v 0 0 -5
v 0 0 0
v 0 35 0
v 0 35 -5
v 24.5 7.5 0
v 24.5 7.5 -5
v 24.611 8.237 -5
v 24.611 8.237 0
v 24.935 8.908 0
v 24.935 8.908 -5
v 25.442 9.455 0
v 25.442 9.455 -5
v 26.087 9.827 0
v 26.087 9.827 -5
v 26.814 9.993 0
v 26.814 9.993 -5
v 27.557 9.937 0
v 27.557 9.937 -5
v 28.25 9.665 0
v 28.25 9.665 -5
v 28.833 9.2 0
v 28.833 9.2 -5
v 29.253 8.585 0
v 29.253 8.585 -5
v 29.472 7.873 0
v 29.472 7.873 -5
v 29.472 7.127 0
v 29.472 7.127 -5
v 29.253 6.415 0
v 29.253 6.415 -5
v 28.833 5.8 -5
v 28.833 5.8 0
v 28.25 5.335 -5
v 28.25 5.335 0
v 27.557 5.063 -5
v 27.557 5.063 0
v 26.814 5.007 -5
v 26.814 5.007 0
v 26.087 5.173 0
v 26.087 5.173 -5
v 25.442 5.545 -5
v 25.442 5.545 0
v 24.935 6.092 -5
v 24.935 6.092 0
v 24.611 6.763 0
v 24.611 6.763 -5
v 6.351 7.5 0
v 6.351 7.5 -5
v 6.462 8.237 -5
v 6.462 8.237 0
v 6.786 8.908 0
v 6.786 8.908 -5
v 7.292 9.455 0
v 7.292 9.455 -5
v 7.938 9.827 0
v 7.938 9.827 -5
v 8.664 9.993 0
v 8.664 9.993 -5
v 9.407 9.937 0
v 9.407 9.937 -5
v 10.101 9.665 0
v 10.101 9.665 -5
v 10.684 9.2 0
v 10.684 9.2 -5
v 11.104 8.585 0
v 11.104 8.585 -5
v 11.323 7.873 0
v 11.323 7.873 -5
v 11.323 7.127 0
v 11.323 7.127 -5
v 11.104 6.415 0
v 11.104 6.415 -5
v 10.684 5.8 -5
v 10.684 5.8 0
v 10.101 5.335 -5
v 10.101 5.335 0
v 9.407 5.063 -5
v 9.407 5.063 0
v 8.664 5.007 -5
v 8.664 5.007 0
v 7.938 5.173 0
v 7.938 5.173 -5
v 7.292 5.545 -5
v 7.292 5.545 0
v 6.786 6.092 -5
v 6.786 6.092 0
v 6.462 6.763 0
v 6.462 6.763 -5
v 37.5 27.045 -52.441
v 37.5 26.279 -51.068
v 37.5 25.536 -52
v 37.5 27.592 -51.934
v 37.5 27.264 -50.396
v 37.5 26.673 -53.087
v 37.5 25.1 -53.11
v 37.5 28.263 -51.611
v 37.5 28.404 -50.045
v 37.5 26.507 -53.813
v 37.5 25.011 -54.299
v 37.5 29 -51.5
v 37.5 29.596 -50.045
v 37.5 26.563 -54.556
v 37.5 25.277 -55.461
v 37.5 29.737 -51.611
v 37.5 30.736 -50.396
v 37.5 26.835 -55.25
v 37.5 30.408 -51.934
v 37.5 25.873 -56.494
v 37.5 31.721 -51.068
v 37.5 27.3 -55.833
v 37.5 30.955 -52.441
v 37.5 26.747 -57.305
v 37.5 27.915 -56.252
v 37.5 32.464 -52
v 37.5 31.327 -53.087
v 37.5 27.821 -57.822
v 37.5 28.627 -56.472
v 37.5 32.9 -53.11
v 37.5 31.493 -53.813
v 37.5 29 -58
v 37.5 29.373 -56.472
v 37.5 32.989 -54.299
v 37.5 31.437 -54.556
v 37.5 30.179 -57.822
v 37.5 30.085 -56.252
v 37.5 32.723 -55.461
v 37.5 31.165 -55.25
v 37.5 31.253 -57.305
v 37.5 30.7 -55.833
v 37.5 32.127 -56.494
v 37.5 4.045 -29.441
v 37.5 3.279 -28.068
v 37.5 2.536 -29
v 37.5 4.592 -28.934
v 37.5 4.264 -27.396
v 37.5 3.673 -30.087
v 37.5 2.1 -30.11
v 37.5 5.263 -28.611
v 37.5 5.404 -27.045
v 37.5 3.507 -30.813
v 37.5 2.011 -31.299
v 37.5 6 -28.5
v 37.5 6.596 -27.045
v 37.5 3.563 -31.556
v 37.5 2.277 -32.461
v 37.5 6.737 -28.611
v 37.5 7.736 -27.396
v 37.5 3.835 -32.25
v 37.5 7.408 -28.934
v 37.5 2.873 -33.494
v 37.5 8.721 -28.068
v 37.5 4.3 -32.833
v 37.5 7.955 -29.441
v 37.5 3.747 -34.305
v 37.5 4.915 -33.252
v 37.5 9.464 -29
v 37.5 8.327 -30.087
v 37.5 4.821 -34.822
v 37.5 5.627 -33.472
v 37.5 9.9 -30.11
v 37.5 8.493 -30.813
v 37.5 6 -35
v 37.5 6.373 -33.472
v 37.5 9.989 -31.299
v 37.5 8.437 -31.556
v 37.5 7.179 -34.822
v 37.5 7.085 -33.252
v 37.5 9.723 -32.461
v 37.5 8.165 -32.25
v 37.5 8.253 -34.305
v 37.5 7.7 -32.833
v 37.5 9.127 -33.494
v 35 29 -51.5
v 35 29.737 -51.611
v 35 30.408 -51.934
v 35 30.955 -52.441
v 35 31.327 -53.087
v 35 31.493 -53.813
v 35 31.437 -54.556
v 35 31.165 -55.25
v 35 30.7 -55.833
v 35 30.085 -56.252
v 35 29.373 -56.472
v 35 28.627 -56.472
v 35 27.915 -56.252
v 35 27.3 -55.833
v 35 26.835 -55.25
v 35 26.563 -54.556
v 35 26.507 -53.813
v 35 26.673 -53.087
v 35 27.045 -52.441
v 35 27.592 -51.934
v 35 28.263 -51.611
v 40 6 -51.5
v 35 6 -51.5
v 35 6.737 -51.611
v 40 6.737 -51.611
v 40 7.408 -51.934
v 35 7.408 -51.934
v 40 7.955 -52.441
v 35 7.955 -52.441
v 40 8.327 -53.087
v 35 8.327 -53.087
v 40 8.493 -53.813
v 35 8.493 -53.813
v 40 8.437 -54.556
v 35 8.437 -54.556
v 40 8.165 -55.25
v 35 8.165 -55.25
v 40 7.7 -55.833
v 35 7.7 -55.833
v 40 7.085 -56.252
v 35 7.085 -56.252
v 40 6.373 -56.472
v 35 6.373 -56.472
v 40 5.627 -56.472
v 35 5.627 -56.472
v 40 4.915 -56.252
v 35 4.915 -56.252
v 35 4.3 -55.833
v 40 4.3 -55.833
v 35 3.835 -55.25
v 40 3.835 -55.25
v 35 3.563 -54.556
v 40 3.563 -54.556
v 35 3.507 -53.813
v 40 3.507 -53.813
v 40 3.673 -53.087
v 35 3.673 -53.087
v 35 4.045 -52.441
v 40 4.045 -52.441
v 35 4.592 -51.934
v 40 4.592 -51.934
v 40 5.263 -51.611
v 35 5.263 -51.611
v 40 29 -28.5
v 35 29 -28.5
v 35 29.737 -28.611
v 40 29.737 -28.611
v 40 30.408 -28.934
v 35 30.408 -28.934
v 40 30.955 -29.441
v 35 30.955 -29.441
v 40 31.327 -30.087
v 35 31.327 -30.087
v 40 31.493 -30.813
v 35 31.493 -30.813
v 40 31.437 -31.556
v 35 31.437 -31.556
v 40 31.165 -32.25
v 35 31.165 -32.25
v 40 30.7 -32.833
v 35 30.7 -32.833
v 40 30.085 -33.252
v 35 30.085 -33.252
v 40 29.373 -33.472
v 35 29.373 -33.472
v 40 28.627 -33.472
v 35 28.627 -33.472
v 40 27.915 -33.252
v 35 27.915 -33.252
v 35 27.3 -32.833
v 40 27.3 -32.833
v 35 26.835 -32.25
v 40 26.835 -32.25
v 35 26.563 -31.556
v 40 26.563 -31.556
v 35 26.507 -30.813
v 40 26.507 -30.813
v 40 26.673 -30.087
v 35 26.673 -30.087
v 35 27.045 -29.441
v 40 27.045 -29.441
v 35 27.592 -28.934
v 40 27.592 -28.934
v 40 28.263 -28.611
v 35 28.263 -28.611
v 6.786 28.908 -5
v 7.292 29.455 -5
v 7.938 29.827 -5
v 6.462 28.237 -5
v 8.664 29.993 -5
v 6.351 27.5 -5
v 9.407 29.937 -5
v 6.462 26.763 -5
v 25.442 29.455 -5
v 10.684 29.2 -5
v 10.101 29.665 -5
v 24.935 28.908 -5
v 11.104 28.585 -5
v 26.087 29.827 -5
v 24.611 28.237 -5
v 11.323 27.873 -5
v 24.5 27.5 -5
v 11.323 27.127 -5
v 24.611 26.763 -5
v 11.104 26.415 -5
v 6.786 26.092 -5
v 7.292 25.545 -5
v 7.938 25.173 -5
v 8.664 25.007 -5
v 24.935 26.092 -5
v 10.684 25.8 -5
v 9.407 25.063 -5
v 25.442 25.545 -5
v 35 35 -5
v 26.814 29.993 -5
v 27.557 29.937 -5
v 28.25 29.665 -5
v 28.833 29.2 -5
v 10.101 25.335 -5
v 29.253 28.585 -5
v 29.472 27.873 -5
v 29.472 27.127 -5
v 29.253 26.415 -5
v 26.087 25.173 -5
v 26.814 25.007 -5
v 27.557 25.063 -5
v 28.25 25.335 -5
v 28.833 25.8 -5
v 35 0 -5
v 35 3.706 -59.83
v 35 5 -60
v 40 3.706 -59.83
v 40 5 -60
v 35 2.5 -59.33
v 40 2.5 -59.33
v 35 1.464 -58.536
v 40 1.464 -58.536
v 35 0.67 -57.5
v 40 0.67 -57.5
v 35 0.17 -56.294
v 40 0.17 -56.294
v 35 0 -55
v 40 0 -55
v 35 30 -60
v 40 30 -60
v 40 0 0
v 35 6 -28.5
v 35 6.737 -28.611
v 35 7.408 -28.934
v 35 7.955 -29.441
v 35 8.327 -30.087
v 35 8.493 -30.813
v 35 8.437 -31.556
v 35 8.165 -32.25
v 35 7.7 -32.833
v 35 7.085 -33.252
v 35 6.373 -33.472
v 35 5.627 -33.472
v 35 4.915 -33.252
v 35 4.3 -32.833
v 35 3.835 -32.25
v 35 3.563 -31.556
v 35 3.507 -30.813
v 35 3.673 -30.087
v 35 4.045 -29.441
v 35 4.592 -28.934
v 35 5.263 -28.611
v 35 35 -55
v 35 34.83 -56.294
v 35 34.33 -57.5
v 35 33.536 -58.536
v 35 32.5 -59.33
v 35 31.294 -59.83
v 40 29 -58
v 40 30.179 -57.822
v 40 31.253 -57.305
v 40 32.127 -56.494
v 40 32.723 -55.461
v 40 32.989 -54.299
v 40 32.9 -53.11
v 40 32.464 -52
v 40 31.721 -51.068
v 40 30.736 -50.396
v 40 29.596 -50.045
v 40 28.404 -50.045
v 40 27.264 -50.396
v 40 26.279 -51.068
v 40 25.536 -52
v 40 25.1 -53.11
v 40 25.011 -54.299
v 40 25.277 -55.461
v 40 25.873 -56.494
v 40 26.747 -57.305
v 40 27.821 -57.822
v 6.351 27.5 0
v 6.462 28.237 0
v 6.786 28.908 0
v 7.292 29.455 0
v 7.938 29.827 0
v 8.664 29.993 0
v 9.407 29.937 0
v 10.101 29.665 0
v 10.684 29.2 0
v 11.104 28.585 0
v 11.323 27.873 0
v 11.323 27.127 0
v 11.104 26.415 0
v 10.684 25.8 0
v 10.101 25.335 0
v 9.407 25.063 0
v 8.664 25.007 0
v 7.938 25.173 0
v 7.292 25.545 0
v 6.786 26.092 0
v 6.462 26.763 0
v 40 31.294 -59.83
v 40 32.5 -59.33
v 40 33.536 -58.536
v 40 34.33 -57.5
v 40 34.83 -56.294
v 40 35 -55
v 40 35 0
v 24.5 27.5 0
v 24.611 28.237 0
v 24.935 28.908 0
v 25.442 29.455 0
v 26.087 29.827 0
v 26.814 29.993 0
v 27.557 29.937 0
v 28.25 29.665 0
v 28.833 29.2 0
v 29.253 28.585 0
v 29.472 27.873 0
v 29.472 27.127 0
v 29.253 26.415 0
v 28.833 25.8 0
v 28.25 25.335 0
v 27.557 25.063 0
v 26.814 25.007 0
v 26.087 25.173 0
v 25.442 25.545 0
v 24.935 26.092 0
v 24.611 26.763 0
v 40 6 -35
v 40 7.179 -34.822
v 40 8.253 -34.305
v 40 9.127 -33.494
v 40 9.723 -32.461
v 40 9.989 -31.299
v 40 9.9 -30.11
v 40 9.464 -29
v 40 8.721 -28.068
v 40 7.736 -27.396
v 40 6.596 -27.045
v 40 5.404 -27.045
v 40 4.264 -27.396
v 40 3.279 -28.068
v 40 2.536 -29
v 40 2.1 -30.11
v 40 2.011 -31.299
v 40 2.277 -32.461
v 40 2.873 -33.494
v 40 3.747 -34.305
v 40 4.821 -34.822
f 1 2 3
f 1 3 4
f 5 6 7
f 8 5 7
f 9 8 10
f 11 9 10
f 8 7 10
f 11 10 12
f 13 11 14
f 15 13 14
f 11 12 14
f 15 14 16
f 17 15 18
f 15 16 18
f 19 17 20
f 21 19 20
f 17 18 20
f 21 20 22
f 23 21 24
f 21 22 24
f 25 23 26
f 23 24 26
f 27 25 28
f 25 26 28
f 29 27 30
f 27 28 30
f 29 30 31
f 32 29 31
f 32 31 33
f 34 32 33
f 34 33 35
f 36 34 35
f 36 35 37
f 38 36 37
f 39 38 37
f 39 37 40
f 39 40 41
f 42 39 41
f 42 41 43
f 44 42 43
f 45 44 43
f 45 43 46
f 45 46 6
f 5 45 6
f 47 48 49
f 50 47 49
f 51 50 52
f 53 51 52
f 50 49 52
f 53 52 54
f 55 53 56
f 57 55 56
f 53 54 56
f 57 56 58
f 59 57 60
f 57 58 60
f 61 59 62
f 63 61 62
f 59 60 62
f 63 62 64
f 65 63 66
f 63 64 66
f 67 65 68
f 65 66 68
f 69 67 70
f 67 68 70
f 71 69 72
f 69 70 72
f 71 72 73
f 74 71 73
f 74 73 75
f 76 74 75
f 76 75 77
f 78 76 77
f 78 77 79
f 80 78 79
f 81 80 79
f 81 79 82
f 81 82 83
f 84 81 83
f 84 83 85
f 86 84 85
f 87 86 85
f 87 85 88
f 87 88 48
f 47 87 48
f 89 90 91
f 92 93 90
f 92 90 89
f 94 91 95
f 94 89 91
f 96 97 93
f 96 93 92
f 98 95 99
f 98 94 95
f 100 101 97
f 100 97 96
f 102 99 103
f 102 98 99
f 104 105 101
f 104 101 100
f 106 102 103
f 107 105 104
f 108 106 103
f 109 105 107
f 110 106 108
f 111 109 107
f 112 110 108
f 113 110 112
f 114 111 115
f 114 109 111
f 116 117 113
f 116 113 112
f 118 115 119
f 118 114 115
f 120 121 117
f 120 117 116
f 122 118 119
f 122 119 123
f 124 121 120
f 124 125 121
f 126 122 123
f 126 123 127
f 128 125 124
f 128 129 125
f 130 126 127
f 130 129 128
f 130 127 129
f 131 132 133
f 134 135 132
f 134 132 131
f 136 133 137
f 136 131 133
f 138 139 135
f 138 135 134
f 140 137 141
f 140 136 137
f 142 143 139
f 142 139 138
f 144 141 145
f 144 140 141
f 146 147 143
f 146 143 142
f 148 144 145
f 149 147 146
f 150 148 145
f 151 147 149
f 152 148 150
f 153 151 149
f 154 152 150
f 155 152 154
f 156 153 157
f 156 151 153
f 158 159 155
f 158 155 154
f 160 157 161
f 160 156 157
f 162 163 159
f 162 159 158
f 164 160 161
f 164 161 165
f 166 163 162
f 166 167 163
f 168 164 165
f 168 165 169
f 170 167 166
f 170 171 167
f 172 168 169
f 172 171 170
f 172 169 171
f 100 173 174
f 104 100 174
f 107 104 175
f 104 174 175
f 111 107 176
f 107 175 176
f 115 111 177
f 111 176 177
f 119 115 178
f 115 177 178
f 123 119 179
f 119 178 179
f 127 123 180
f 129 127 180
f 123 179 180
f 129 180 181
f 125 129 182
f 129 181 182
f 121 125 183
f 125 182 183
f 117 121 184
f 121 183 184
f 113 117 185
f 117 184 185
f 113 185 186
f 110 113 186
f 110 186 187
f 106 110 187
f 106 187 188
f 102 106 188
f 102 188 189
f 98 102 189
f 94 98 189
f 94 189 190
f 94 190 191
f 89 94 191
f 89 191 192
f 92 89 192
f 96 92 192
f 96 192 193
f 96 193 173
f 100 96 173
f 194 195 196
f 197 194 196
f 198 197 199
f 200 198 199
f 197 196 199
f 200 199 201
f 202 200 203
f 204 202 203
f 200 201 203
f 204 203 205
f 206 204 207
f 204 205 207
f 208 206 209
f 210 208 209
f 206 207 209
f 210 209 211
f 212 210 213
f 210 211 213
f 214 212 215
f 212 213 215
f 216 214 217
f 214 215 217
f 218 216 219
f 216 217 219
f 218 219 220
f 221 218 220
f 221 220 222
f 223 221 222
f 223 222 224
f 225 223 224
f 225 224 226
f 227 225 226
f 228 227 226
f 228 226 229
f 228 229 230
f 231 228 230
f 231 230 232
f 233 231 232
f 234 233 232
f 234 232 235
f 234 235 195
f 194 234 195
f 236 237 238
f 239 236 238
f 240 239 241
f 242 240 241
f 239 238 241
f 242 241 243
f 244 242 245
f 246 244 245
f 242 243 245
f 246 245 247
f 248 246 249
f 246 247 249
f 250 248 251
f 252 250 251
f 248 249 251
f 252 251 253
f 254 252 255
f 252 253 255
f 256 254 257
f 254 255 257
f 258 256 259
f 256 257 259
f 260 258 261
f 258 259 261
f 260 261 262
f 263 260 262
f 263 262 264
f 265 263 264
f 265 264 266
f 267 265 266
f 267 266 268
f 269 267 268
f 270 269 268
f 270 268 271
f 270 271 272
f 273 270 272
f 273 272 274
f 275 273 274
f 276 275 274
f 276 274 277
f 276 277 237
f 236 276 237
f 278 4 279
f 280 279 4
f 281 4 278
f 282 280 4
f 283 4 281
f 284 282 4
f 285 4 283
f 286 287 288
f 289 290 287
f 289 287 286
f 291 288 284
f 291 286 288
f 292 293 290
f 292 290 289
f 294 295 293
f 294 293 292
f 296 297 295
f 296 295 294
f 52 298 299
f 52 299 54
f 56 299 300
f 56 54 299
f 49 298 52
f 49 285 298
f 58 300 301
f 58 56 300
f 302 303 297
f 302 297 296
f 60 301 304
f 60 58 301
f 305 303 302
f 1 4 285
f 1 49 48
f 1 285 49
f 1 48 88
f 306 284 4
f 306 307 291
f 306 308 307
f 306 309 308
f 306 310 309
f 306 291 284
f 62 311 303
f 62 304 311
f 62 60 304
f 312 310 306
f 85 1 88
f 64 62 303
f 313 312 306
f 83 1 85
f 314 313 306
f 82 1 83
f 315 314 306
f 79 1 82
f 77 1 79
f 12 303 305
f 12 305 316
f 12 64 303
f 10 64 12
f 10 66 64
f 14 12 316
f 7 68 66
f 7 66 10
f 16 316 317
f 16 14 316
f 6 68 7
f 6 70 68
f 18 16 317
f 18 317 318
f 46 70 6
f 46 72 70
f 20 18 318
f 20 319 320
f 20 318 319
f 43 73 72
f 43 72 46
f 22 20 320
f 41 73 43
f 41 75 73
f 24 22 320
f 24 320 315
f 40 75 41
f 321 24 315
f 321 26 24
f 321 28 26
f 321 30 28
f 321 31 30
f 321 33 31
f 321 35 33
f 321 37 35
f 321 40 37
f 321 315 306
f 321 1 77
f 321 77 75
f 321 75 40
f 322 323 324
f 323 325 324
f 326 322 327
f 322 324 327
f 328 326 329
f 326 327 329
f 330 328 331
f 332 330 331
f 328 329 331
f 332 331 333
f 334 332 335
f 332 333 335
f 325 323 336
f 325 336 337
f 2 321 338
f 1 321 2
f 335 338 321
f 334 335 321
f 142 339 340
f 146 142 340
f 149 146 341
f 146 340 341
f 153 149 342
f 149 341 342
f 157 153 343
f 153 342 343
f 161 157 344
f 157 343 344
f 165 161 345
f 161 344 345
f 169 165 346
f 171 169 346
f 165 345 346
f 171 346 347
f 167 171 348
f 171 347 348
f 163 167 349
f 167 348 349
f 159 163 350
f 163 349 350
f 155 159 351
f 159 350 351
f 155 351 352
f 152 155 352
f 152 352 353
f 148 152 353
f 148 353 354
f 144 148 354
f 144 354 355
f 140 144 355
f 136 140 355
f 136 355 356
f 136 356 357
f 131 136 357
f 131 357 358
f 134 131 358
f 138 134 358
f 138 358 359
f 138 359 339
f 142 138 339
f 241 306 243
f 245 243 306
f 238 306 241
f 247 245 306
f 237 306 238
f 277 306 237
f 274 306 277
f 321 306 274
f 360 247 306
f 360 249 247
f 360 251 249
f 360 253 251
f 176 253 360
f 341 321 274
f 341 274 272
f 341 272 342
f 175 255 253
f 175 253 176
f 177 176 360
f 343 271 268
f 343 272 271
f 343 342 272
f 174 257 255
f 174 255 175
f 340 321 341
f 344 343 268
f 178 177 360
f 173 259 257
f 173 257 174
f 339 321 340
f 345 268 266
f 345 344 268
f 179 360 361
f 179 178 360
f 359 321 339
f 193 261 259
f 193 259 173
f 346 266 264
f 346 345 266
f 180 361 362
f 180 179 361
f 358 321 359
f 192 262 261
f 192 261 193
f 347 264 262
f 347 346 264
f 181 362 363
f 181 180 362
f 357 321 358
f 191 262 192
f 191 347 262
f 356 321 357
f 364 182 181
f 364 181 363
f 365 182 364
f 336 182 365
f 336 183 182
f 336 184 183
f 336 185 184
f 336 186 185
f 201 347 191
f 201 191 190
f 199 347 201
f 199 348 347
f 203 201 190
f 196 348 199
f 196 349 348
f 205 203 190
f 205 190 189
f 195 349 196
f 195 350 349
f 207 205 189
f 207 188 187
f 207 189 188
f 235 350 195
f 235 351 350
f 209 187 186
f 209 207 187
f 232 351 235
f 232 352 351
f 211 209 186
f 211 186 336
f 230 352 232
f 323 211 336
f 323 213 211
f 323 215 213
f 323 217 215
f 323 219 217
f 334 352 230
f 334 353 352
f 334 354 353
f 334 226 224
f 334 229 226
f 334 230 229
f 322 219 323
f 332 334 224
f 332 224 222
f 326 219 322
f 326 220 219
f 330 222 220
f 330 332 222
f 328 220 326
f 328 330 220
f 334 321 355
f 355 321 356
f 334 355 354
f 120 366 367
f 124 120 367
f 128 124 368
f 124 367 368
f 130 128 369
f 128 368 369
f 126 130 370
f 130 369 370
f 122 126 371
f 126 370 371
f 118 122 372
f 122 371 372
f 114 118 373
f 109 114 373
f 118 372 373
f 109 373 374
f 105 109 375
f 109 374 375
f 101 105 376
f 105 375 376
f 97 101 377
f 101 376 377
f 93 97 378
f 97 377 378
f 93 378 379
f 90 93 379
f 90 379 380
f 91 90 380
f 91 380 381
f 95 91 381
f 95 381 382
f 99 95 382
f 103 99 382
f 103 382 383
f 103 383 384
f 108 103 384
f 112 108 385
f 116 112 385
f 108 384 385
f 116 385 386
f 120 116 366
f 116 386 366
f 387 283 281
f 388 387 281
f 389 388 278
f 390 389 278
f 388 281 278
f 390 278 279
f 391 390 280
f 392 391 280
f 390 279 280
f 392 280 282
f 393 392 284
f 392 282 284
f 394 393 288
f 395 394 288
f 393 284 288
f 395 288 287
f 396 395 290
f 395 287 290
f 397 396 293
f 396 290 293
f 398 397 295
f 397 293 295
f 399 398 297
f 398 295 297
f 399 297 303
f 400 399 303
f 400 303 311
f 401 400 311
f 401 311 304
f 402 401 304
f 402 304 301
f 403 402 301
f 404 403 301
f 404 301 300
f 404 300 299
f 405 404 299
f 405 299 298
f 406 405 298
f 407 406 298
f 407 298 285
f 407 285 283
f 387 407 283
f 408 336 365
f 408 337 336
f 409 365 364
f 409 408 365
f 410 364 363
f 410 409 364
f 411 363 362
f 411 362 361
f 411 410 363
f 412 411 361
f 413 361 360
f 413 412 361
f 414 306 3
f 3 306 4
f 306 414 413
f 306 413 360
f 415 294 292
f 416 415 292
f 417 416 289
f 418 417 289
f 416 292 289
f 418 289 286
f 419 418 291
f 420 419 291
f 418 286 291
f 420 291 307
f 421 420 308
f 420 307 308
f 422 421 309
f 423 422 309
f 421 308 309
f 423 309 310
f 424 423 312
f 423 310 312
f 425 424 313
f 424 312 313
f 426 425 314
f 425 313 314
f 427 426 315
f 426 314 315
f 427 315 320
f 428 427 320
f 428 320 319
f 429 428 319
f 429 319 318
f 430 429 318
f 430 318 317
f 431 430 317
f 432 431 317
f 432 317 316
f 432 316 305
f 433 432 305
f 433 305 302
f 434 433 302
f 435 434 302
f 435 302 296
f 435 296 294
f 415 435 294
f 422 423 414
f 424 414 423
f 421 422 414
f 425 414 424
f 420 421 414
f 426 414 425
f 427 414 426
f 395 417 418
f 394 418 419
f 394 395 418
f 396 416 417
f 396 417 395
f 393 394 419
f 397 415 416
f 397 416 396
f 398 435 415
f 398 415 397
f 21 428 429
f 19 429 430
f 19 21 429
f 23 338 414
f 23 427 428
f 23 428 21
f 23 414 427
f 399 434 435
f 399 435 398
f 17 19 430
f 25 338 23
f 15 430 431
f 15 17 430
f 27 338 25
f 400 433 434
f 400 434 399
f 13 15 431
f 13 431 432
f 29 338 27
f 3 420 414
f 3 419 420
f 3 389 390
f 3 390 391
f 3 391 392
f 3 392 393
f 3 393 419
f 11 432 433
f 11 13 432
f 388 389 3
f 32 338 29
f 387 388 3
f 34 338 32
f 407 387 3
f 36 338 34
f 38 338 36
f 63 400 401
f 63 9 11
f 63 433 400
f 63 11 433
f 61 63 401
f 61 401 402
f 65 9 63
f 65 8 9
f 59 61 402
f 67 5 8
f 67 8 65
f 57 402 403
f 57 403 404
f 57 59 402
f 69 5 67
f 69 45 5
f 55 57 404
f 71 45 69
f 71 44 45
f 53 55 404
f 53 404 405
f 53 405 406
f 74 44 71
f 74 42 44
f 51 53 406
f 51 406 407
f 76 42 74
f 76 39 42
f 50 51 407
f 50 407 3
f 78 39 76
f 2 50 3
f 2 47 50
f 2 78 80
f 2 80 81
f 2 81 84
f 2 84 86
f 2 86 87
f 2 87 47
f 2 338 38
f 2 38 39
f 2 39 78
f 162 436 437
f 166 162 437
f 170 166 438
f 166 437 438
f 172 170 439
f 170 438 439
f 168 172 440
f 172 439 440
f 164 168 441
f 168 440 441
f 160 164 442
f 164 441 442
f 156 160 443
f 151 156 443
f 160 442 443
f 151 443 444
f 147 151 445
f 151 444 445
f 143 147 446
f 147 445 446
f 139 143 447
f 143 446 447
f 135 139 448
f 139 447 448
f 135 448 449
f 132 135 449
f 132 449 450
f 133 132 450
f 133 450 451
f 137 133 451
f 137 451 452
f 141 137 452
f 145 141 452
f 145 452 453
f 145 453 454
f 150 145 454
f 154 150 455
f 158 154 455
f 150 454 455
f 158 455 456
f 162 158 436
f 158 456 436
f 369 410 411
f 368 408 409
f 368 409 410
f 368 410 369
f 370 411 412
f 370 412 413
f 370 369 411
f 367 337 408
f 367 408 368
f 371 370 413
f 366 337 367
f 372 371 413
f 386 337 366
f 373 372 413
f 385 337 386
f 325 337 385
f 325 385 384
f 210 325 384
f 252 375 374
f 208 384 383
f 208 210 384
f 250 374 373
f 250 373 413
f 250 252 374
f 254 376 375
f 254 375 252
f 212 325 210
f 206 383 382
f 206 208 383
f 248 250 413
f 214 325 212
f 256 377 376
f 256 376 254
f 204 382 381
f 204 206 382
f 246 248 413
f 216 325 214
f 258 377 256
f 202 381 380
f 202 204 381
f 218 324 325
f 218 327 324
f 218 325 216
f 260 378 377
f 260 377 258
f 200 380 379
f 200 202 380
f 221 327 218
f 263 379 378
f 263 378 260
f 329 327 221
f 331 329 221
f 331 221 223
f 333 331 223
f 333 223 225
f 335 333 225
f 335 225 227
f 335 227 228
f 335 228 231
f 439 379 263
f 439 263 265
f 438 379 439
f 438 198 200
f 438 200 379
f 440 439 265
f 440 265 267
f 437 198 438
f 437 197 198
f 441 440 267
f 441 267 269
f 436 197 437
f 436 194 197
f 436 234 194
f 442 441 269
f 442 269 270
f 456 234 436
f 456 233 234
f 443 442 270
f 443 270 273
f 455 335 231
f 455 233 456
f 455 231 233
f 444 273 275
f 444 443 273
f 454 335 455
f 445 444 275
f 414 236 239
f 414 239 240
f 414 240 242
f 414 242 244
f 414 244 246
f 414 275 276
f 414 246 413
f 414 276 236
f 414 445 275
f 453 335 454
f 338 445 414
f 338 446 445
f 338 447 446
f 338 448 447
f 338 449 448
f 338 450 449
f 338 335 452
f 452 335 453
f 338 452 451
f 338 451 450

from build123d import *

# Parameters (mm, degrees)
BOSS_EXTRUDE1_DEPTH = 35
FILLET1_R           = 5
SKETCH2_R           = 2.5
CUT_EXTRUDE1_DEPTH  = 6
SKETCH3_R           = 2.5
CUT_EXTRUDE3_DEPTH  = 6
SKETCH5_R           = 4
CUT_EXTRUDE5_DEPTH  = 2.5


with BuildPart() as part:
    # Sketch1 → Boss-Extrude1 (new body)
    with BuildSketch(Plane(origin=(0, 0, 0), x_dir=(1, 0, 0), z_dir=(0, 1, 0))):
        Polygon((0, 0), (0, 5), (35, 5), (35, 60), (40, 60), (40, 0), align=None)
    extrude(amount=BOSS_EXTRUDE1_DEPTH)

    # Fillet1
    fillet1_edges = [part.edges().sort_by_distance(p)[0] for p in [
        (37.5, 35, -60),
        (37.5, 0, -60),
    ]]
    fillet(fillet1_edges, radius=FILLET1_R)

    # Sketch2 → Cut-Extrude1 (cut, through all)
    with BuildSketch(Plane(origin=(0, 0, -5), x_dir=(-1, 0, 0), z_dir=(0, 0, -1))):
        with Locations((-27.000416448, 27.5)):
            Circle(SKETCH2_R)
        with Locations((-8.85118862, 27.5)):
            Circle(SKETCH2_R)
        with Locations((-27.000416448, 7.5)):
            Circle(SKETCH2_R)
        with Locations((-8.85118862, 7.5)):
            Circle(SKETCH2_R)
    extrude(amount=-CUT_EXTRUDE1_DEPTH, mode=Mode.SUBTRACT)

    # Sketch3 → Cut-Extrude3 (cut, through all)
    with BuildSketch(Plane.ZY.offset(-35)):
        with Locations((-31, 29)):
            Circle(SKETCH3_R)
        with Locations((-54, 6)):
            Circle(SKETCH3_R)
        with Locations((-54, 29)):
            Circle(SKETCH3_R)
        with Locations((-31, 6)):
            Circle(SKETCH3_R)
    extrude(amount=-CUT_EXTRUDE3_DEPTH, mode=Mode.SUBTRACT)

    # Sketch5 → Cut-Extrude5 (cut)
    with BuildSketch(Plane(origin=(40, 0, 0), x_dir=(0, 0, -1), z_dir=(1, 0, 0))):
        with Locations((54, 29)):
            Circle(SKETCH5_R)
        with Locations((31, 6)):
            Circle(SKETCH5_R)
    extrude(amount=-CUT_EXTRUDE5_DEPTH, mode=Mode.SUBTRACT)


solid = part.part
